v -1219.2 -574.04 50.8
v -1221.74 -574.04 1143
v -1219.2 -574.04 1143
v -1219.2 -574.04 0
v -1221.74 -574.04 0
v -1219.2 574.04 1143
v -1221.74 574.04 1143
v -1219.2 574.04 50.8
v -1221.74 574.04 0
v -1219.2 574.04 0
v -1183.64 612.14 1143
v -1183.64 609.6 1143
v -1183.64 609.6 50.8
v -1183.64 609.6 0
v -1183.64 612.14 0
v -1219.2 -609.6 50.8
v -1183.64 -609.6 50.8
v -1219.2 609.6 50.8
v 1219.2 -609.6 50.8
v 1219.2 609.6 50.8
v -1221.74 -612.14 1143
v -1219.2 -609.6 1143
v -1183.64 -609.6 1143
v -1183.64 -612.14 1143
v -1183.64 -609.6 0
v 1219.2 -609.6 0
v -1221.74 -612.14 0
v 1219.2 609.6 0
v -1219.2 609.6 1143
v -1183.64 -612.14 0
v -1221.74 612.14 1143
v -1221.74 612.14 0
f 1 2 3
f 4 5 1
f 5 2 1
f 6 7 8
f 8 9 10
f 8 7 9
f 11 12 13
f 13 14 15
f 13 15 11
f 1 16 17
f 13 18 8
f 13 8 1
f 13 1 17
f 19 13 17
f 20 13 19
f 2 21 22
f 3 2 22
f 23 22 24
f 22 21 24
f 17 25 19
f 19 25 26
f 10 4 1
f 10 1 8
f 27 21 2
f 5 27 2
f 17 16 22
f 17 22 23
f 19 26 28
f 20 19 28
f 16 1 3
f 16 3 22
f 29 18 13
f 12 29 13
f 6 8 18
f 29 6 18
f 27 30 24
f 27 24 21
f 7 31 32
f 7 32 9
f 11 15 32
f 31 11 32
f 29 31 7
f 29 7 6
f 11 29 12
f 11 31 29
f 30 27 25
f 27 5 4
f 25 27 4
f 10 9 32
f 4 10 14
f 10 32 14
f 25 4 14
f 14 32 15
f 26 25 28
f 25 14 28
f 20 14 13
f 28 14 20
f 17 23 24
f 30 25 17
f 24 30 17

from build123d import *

# Parameters (mm, degrees)
F0_W     = 2438.4
F0_H     = 1219.2
F1_DEPTH = 50.8
F3_DEPTH = 1143


with BuildPart() as f1:
    # F0 (on Top) → F1 (new body)
    with BuildSketch(Plane.XY):
        Rectangle(F0_W, F0_H)
    extrude(amount=F1_DEPTH)

    # F2 (on face) → F3 (join)
    with BuildSketch(Plane(origin=(0, 0, 0), x_dir=(1, 0, 0), z_dir=(0, 0, -1))):
        Polygon((-1183.64, 612.14), (-1221.74, 612.14), (-1221.74, 574.04), (-1219.2, 574.04), (-1219.2, 609.6), (-1183.64, 609.6), align=None)
    extrude(amount=-F3_DEPTH)

    # F4: F1 across plane


with BuildPart() as f1_1:
    add(f1.part)
    add(f1.part.mirror(Plane.XZ))


solid = f1_1.part
